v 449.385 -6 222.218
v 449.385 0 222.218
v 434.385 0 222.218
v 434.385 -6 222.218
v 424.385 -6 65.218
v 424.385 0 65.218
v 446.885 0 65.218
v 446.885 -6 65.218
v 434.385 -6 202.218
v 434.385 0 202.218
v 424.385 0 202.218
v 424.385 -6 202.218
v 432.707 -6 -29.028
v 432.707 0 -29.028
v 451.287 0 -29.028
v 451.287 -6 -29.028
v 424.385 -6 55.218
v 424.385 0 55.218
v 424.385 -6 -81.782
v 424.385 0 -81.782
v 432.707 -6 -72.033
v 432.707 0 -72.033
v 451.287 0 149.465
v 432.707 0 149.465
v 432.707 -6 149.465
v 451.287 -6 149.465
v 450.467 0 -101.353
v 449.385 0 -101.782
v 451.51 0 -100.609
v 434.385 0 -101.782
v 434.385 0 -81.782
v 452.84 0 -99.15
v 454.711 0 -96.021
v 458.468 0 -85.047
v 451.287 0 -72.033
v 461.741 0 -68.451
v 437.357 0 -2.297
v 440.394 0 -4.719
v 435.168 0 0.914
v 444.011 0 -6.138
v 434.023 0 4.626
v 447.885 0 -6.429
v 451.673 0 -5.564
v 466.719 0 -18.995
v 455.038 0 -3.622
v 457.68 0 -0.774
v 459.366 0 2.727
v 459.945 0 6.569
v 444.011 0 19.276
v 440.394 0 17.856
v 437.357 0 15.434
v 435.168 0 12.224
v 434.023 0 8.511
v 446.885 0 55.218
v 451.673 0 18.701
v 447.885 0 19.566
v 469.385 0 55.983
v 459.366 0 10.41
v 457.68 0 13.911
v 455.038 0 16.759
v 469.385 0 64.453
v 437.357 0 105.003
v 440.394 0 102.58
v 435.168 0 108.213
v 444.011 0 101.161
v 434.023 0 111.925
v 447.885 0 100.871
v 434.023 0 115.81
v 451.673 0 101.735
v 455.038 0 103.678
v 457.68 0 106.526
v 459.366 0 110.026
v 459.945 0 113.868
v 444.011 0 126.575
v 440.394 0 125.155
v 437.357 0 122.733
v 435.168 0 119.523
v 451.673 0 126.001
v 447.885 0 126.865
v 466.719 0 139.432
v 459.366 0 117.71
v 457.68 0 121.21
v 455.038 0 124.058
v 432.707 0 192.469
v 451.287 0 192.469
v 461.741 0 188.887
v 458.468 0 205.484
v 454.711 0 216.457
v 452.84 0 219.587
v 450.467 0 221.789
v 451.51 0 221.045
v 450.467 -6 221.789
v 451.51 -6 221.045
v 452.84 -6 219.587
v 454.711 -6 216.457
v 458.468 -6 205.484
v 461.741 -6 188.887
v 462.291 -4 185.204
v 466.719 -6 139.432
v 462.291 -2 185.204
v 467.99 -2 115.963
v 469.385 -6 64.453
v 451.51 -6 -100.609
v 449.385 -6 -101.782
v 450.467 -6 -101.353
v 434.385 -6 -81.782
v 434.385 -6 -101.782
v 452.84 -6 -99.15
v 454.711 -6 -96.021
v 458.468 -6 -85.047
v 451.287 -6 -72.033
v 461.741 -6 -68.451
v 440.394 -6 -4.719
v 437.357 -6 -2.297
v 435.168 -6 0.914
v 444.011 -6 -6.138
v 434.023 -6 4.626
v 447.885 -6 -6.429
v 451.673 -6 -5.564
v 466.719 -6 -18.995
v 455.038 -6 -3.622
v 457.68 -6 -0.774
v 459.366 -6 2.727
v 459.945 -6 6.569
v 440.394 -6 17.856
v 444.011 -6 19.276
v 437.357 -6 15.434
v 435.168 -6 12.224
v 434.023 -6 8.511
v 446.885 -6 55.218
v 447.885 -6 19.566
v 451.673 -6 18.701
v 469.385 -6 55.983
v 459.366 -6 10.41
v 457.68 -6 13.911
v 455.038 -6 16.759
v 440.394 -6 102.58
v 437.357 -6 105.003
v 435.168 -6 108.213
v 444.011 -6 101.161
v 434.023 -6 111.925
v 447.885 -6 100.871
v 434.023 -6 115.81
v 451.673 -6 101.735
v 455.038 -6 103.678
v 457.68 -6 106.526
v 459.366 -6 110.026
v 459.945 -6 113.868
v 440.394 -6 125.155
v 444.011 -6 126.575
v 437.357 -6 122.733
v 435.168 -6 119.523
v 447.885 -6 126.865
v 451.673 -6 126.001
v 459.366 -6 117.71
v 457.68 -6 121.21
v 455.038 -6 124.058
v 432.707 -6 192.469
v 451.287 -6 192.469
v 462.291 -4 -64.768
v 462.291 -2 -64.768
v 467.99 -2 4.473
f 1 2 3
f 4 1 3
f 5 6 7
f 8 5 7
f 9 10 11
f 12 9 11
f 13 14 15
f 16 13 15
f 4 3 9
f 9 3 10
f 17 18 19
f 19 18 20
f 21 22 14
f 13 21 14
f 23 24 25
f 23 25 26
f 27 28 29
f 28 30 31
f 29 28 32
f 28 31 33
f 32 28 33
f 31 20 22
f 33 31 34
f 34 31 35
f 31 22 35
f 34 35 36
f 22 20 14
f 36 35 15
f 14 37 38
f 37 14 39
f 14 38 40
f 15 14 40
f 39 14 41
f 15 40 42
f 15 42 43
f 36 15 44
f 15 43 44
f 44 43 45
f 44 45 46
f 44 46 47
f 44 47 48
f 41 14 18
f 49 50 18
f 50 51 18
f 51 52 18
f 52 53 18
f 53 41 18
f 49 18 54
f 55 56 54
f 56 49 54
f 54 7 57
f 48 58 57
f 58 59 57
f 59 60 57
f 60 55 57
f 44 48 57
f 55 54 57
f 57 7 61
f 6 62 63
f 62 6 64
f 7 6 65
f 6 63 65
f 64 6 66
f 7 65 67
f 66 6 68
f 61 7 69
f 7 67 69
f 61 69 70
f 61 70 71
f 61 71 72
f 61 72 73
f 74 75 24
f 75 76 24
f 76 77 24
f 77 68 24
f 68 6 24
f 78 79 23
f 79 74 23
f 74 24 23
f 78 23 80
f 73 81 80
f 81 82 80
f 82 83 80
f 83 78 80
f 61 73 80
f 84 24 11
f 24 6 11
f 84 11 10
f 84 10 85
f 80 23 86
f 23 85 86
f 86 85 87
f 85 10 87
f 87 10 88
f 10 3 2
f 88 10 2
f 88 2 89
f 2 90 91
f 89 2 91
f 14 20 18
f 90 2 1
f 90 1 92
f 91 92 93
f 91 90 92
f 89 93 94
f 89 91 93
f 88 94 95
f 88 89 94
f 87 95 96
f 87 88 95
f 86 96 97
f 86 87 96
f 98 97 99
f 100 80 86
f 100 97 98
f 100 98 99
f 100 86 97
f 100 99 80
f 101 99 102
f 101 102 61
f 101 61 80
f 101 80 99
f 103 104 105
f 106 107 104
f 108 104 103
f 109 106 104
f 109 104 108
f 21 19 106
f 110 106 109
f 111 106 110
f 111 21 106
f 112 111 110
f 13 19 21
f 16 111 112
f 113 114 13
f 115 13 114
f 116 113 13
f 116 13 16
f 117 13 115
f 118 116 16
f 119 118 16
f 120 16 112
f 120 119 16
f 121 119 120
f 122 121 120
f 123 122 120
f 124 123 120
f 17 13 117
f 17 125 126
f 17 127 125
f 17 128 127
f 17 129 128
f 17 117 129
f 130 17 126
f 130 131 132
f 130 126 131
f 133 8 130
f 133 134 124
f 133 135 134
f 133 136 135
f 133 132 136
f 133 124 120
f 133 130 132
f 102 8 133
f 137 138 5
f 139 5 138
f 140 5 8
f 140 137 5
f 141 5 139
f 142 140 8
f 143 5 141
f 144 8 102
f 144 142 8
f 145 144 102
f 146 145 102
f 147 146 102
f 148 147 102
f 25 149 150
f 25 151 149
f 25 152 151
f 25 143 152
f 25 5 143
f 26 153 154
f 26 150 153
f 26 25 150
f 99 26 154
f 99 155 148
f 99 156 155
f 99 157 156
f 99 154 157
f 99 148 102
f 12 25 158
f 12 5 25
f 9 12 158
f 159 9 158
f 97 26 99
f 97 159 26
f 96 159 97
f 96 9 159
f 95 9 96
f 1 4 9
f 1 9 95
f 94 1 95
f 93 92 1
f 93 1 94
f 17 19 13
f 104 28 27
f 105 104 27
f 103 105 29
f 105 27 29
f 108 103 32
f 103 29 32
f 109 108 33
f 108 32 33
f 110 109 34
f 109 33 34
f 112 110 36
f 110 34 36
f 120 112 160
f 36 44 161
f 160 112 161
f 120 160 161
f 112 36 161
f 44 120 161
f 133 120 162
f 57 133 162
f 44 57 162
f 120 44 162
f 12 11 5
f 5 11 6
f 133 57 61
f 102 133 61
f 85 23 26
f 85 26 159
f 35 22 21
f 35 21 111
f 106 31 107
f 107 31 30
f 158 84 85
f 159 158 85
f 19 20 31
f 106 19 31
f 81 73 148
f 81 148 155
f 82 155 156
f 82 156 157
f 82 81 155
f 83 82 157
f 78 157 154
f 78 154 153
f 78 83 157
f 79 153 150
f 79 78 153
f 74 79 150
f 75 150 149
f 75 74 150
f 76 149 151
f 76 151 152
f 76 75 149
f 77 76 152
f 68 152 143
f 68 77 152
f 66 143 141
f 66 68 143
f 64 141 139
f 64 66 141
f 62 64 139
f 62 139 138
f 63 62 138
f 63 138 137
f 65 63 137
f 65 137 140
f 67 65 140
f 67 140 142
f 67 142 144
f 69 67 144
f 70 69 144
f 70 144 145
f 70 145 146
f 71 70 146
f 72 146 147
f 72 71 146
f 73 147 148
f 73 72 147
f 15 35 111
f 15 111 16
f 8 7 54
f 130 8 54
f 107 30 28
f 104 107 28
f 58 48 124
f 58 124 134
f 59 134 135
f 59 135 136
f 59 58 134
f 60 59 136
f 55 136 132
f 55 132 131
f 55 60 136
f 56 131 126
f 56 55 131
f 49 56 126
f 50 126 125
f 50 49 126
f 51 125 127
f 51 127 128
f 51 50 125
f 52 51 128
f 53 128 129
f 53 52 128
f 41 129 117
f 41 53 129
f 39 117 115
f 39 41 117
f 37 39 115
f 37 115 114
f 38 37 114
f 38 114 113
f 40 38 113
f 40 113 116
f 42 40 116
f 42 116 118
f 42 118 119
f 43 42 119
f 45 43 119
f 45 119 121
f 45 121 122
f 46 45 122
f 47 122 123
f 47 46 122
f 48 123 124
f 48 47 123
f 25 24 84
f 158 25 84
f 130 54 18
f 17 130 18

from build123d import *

# Parameters (mm, degrees)
F0_W     = 18.579781
F0_H     = 43.004439
F0_R     = 13.03372
F0_H_2   = 43.004438
F1_DEPTH = 6


with BuildPart() as f1:
    # F0 (on Front) → F1 (new body)
    with BuildSketch(Plane.XZ):
        with BuildLine():
            Line((469.384881, 55.983145), (469.384881, 60.218248))
            Line((469.384881, 60.218248), (446.884881, 60.218248))
            Line((446.884881, 60.218248), (446.884881, 55.218248))
            Line((446.884881, 55.218248), (424.384881, 55.218248))
            Line((424.384881, 55.218248), (424.384881, -81.781752))
            Line((424.384881, -81.781752), (434.384881, -81.781752))
            Line((434.384881, -81.781752), (434.384881, -101.781752))
            Line((434.384881, -101.781752), (449.384881, -101.781752))
            add(Edge.make_bspline(
                [(449.384881, -101.781752), (466.863722, -97.534394), (469.173006, 29.991541), (469.384881, 55.983145)],
                knots=[0, 0, 0, 0, 142.653474, 142.653474, 142.653474, 142.653474], degree=3))
        make_face()
        with Locations((441.996842, -50.5303)):
            Rectangle(F0_W, F0_H, mode=Mode.SUBTRACT)
        with Locations((446.911335, 6.56864)):
            Circle(F0_R, mode=Mode.SUBTRACT)
        with BuildLine():
            add(Edge.make_bspline(
                [(449.384881, 222.218248), (466.863722, 217.97089), (469.173006, 90.444955), (469.384881, 64.453351)],
                knots=[0, 0, 0, 0, 142.653474, 142.653474, 142.653474, 142.653474], degree=3))
            Line((449.384881, 222.218248), (434.384881, 222.218248))
            Line((434.384881, 222.218248), (434.384881, 202.218248))
            Line((434.384881, 202.218248), (424.384881, 202.218248))
            Line((424.384881, 202.218248), (424.384881, 65.218248))
            Line((424.384881, 65.218248), (446.884881, 65.218248))
            Line((446.884881, 65.218248), (446.884881, 60.218248))
            Line((446.884881, 60.218248), (469.384881, 60.218248))
            Line((469.384881, 60.218248), (469.384881, 64.453351))
        make_face()
        with Locations((441.996842, 170.966796)):
            Rectangle(F0_W, F0_H_2, mode=Mode.SUBTRACT)
        with Locations((446.911335, 113.867856)):
            Circle(F0_R, mode=Mode.SUBTRACT)
    extrude(amount=F1_DEPTH)


solid = f1.part
